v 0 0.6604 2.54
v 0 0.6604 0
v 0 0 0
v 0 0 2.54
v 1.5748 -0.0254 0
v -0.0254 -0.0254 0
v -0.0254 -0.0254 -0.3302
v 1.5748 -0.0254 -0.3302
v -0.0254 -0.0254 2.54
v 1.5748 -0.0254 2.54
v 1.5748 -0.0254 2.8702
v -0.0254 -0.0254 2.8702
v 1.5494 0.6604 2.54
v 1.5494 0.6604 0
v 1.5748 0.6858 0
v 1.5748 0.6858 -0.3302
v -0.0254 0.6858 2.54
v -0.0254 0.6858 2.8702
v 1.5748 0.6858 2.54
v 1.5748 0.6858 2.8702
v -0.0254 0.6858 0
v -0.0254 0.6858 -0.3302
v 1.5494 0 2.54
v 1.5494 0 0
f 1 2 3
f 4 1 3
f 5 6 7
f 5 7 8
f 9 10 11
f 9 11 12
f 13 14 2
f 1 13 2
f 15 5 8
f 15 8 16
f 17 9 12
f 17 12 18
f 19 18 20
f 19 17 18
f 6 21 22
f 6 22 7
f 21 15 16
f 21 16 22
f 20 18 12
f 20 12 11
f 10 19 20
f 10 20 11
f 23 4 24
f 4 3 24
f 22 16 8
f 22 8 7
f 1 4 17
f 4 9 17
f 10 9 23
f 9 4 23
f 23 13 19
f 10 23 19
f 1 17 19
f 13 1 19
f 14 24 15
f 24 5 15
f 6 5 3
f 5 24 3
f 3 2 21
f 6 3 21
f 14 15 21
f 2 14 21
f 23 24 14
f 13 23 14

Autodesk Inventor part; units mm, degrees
ref_plane "YZ Plane" through (0, 0, 0) normal (1, 0, 0) x (0, 1, 0)
ref_plane "XZ Plane" through (0, 0, 0) normal (0, 1, 0) x (-1, 0, 0)
ref_plane "XY Plane" through (0, 0, 0) normal (0, 0, 1) x (1, 0, 0)
sketch "Sketch1" plane through (0, 0, 0) normal (0, 0, 1) x (1, 0, 0)
  line L0 (0, 0) -> (1.5494, 0)
  line L1 (1.5494, 0) -> (1.5494, 0.6604)
  line L2 (1.5494, 0.6604) -> (0, 0.6604)
  line L3 (0, 0.6604) -> (0, 0)
  dimension "d0" = 0.6604
  dimension "d1" = 1.5494
extrude "Extrusion1" add sketch "Sketch1" along normal blind 2.54
sketch "Sketch2" plane through (0, 0, 2.54) normal (0, 0, 1) x (1, 0, 0)
  line L0 (-0.0254, 0.6858) -> (1.5748, 0.6858)
  line L1 (1.5748, 0.6858) -> (1.5748, -0.0254)
  line L2 (1.5748, -0.0254) -> (-0.0254, -0.0254)
  line L3 (-0.0254, -0.0254) -> (-0.0254, 0.6858)
  line L4 (1.5494, 0) -> (1.5494, 0.6604) projected
  line L5 (0, 0.6604) -> (0, 0) projected
  line L6 (0, 0) -> (1.5494, 0) projected
  line L7 (1.5494, 0.6604) -> (0, 0.6604) projected
  dimension "d4" = 0.0254
  dimension "d5" = 0.0254
  dimension "d6" = 0.0254
  dimension "d7" = 0.0254
extrude "Extrusion2" add sketch "Sketch2" along normal blind 0.3302 contours L0 L1 L2 L3 | L6 L5 L7 L4
sketch "Sketch3" plane through (0, 0, 0) normal (0, 0, -1) x (-1, 0, 0)
  line L0 (0.0254, -0.0254) -> (-1.5748, -0.0254)
  line L1 (-1.5748, -0.0254) -> (-1.5748, 0.6858)
  line L2 (-1.5748, 0.6858) -> (0.0254, 0.6858)
  line L3 (0.0254, 0.6858) -> (0.0254, -0.0254)
  point P0 (0, 0)
extrude "Extrusion3" add sketch "Sketch3" along normal blind 0.3302
properties part number "s470 Resistor"
